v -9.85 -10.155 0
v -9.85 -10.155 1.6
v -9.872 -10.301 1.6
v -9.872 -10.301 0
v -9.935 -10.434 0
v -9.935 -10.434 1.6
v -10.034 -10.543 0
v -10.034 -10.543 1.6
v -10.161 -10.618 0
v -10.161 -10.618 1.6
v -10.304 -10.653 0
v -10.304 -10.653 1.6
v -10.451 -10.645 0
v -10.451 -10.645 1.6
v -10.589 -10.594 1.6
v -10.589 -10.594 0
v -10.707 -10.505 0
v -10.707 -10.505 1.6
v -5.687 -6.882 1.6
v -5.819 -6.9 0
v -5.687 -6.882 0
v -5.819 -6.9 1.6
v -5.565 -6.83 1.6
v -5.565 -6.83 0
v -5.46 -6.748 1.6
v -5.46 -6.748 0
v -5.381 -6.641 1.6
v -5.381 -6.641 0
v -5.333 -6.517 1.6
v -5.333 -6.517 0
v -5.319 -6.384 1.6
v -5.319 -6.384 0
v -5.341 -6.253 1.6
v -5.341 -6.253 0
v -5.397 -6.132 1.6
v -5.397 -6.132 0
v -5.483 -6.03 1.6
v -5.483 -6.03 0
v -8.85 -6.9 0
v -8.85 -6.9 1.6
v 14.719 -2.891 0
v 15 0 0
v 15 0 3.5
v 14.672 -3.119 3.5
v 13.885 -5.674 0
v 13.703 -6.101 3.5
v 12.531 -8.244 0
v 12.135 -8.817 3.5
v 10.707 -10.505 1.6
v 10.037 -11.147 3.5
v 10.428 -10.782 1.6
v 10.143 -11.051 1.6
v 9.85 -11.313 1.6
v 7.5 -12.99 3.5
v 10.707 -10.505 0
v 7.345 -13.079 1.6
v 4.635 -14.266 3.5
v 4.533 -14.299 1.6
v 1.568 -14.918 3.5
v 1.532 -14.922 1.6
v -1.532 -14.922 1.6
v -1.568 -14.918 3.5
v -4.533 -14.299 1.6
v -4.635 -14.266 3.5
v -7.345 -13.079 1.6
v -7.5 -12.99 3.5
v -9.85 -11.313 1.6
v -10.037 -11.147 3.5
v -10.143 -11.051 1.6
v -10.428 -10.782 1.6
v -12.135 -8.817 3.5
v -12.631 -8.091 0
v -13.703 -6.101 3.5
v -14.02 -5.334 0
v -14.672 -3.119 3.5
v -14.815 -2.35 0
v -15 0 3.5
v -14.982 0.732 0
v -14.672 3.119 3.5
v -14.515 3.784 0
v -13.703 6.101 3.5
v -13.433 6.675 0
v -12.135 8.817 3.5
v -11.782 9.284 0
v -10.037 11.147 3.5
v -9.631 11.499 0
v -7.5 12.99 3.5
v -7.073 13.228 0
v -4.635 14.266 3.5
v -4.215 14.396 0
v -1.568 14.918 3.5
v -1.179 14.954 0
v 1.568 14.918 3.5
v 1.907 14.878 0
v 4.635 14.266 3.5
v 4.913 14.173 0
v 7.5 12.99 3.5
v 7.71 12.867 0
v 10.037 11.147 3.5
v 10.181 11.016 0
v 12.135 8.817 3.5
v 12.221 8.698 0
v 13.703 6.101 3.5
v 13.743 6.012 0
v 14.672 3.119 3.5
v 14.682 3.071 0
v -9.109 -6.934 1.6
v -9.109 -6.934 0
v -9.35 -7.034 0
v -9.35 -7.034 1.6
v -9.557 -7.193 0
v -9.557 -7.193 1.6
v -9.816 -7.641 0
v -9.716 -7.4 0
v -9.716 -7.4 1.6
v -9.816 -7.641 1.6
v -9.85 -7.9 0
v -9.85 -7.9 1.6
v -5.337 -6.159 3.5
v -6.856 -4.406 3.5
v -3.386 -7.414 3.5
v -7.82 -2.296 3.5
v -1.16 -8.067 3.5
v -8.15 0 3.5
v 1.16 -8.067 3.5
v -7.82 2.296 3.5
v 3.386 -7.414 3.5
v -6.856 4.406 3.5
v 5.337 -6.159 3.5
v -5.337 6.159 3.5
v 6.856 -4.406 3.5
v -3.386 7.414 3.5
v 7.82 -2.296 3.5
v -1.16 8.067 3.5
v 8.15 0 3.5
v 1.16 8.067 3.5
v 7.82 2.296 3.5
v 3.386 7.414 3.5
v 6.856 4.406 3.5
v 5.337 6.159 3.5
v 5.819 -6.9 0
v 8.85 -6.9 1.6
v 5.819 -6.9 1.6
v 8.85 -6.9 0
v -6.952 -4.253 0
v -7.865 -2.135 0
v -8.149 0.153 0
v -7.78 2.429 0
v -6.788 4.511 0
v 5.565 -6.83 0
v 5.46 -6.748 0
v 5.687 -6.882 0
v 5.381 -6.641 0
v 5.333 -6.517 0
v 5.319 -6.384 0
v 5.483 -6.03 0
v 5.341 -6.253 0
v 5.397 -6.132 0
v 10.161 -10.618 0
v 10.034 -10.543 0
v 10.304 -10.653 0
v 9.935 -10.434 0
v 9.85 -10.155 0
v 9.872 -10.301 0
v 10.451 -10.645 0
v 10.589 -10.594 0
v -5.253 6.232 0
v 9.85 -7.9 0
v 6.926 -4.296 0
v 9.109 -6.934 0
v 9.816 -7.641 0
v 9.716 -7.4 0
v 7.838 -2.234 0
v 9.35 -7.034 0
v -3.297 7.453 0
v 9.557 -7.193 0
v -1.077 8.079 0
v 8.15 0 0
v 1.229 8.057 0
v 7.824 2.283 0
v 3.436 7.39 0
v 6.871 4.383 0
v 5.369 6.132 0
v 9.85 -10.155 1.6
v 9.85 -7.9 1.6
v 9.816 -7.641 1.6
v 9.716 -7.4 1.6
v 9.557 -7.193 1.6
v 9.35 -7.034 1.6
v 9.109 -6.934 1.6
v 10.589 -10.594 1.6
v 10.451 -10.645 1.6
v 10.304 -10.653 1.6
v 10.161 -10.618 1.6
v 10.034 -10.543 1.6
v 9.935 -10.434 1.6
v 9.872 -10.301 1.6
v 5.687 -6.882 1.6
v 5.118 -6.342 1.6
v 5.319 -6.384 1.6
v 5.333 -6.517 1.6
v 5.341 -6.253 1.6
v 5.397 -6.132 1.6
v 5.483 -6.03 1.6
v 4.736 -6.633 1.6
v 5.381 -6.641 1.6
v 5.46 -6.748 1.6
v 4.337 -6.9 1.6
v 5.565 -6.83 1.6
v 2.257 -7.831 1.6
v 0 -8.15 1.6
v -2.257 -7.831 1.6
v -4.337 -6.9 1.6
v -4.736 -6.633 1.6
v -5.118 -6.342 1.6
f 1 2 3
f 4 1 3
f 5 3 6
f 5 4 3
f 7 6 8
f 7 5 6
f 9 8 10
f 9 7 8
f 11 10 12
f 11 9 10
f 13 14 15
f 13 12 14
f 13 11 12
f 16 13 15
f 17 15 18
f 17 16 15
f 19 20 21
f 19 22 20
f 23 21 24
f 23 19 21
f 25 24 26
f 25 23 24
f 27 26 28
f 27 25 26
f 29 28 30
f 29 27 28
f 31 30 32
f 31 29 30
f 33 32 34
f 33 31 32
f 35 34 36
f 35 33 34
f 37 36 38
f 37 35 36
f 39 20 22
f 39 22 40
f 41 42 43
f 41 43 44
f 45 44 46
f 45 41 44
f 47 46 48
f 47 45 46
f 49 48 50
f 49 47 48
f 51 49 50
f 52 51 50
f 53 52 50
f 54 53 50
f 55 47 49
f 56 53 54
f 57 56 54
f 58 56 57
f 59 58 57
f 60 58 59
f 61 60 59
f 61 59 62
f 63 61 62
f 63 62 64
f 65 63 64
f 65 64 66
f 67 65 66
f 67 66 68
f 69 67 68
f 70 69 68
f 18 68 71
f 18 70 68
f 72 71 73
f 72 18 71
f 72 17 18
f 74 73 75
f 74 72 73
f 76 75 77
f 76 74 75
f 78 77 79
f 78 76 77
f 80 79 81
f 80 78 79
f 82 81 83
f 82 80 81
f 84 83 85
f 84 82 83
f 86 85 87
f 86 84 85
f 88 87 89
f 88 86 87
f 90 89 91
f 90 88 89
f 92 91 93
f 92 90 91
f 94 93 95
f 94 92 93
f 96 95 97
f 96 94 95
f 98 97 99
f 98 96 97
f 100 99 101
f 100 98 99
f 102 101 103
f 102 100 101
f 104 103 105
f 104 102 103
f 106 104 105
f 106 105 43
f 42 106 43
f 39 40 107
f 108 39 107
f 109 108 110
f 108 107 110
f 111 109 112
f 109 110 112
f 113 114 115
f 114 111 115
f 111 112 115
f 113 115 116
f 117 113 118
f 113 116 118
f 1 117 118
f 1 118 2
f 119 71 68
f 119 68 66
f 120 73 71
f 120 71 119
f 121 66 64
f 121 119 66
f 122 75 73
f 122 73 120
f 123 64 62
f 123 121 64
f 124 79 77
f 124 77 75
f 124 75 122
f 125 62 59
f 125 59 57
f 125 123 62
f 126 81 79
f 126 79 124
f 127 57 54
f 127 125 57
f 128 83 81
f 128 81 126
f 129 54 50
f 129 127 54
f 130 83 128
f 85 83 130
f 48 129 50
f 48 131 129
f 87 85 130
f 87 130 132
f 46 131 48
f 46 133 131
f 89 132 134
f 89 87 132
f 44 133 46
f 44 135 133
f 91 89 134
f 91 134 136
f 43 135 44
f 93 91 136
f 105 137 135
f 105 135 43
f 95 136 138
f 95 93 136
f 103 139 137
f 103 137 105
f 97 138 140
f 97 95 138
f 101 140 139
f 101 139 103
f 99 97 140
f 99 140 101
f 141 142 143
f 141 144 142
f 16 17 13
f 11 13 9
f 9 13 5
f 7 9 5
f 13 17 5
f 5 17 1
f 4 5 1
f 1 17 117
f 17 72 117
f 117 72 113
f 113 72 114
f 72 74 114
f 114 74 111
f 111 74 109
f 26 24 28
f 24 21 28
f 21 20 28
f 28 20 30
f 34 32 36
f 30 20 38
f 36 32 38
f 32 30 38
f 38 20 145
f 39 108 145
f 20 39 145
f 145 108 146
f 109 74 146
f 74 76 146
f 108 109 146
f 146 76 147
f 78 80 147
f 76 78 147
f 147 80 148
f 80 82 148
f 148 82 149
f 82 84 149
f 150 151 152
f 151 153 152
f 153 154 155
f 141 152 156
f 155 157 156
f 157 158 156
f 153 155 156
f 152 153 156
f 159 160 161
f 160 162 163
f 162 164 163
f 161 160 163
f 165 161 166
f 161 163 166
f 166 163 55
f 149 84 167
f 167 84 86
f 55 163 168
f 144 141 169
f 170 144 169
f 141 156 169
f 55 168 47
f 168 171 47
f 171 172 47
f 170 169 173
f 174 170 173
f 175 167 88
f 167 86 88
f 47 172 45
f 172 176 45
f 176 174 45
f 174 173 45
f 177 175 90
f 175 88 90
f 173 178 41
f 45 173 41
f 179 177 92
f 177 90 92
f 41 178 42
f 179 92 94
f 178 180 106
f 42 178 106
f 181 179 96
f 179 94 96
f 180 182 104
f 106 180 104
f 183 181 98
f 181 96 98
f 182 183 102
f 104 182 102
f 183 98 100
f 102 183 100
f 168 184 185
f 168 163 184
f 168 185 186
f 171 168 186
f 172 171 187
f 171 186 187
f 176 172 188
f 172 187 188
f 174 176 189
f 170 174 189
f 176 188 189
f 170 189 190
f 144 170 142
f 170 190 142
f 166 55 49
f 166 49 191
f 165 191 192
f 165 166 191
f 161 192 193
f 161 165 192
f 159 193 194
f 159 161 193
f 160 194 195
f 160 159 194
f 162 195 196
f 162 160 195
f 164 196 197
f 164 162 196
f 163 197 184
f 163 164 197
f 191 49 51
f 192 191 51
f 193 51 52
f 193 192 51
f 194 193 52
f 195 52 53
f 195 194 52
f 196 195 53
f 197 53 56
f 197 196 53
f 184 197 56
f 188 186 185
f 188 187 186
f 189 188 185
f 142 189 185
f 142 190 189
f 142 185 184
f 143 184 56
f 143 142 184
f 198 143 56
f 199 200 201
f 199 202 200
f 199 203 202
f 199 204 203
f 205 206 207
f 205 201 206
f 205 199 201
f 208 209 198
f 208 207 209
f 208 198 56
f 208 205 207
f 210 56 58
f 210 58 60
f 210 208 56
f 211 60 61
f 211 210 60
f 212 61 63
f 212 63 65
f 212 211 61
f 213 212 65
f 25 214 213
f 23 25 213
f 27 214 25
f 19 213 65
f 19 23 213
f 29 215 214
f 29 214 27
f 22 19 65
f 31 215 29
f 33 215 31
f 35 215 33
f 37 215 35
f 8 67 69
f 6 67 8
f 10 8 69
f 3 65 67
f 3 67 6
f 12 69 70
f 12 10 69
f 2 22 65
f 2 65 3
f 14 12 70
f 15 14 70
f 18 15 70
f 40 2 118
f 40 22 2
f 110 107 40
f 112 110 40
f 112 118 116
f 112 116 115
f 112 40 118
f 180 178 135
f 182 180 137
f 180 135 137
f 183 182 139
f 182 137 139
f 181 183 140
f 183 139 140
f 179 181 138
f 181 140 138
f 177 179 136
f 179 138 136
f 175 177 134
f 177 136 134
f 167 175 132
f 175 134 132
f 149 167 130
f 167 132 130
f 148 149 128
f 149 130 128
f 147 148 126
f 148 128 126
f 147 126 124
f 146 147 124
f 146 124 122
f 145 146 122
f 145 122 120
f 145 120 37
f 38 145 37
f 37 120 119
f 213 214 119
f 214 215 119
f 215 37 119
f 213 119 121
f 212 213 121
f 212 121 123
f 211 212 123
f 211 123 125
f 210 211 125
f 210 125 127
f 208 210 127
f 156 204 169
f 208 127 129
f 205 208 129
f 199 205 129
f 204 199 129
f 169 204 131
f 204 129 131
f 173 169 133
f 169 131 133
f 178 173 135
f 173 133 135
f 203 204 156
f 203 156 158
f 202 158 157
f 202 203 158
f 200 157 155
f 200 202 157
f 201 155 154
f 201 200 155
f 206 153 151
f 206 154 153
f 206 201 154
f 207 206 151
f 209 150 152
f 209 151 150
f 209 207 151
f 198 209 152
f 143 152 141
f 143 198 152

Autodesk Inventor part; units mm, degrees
ref_plane "YZ Plane" through (0, 0, 0) normal (1, 0, 0) x (0, 1, 0)
ref_plane "XZ Plane" through (0, 0, 0) normal (0, 1, 0) x (-1, 0, 0)
ref_plane "XY Plane" through (0, 0, 0) normal (0, 0, 1) x (1, 0, 0)
sketch "スケッチ1" plane through (0, 0, 0) normal (0, 0, 1) x (1, 0, 0)
  circle A0 centre (0, 0) radius 15
  dimension "d0" = 30
extrude "押し出し1" add sketch "スケッチ1" along normal blind 3.5
sketch "スケッチ2" plane through (0, 0, 3.5) normal (0, 0, 1) x (1, 0, 0)
  circle A0 centre (0, 0) radius 4.05
  dimension "d3" = 8.1
extrude "押し出し2" cut sketch "スケッチ2" against normal through all
sketch "スケッチ3" plane through (0, 0, 3.5) normal (0, 0, 1) x (1, 0, 0)
  circle A0 centre (0, 0) radius 8.15
  dimension "d6" = 16.3
extrude "押し出し3" cut sketch "スケッチ3" against normal through all
sketch "スケッチ4" plane through (0, 0, 0) normal (0, 0, -1) x (-1, 0, 0)
  line L0 (-9.85, -6.9) -> (9.85, -6.9)
  line L1 (9.85, -6.9) -> (9.85, -21.9)
  line L2 (9.85, -21.9) -> (-9.85, -21.9)
  line L3 (-9.85, -21.9) -> (-9.85, -6.9)
  line L4 (0, -6.9) -> (0, 0)
  dimension "d9" = 19.7
  dimension "d10" = 6.9
  dimension "d11" = 15
extrude "押し出し4" cut sketch "スケッチ4" against normal blind 1.6
fillet "フィレット2" radius 0.5 4 edges at (4.3373, -6.9, 0.8) (-4.3373, -6.9, 0.8) (9.85, -11.3127, 0.8) (-9.85, -11.3127, 0.8)
fillet "フィレット3" radius 1 2 edges at (-9.85, -6.9, 0.8) (9.85, -6.9, 0.8)
properties part number "ヨー軸スペーサ"
